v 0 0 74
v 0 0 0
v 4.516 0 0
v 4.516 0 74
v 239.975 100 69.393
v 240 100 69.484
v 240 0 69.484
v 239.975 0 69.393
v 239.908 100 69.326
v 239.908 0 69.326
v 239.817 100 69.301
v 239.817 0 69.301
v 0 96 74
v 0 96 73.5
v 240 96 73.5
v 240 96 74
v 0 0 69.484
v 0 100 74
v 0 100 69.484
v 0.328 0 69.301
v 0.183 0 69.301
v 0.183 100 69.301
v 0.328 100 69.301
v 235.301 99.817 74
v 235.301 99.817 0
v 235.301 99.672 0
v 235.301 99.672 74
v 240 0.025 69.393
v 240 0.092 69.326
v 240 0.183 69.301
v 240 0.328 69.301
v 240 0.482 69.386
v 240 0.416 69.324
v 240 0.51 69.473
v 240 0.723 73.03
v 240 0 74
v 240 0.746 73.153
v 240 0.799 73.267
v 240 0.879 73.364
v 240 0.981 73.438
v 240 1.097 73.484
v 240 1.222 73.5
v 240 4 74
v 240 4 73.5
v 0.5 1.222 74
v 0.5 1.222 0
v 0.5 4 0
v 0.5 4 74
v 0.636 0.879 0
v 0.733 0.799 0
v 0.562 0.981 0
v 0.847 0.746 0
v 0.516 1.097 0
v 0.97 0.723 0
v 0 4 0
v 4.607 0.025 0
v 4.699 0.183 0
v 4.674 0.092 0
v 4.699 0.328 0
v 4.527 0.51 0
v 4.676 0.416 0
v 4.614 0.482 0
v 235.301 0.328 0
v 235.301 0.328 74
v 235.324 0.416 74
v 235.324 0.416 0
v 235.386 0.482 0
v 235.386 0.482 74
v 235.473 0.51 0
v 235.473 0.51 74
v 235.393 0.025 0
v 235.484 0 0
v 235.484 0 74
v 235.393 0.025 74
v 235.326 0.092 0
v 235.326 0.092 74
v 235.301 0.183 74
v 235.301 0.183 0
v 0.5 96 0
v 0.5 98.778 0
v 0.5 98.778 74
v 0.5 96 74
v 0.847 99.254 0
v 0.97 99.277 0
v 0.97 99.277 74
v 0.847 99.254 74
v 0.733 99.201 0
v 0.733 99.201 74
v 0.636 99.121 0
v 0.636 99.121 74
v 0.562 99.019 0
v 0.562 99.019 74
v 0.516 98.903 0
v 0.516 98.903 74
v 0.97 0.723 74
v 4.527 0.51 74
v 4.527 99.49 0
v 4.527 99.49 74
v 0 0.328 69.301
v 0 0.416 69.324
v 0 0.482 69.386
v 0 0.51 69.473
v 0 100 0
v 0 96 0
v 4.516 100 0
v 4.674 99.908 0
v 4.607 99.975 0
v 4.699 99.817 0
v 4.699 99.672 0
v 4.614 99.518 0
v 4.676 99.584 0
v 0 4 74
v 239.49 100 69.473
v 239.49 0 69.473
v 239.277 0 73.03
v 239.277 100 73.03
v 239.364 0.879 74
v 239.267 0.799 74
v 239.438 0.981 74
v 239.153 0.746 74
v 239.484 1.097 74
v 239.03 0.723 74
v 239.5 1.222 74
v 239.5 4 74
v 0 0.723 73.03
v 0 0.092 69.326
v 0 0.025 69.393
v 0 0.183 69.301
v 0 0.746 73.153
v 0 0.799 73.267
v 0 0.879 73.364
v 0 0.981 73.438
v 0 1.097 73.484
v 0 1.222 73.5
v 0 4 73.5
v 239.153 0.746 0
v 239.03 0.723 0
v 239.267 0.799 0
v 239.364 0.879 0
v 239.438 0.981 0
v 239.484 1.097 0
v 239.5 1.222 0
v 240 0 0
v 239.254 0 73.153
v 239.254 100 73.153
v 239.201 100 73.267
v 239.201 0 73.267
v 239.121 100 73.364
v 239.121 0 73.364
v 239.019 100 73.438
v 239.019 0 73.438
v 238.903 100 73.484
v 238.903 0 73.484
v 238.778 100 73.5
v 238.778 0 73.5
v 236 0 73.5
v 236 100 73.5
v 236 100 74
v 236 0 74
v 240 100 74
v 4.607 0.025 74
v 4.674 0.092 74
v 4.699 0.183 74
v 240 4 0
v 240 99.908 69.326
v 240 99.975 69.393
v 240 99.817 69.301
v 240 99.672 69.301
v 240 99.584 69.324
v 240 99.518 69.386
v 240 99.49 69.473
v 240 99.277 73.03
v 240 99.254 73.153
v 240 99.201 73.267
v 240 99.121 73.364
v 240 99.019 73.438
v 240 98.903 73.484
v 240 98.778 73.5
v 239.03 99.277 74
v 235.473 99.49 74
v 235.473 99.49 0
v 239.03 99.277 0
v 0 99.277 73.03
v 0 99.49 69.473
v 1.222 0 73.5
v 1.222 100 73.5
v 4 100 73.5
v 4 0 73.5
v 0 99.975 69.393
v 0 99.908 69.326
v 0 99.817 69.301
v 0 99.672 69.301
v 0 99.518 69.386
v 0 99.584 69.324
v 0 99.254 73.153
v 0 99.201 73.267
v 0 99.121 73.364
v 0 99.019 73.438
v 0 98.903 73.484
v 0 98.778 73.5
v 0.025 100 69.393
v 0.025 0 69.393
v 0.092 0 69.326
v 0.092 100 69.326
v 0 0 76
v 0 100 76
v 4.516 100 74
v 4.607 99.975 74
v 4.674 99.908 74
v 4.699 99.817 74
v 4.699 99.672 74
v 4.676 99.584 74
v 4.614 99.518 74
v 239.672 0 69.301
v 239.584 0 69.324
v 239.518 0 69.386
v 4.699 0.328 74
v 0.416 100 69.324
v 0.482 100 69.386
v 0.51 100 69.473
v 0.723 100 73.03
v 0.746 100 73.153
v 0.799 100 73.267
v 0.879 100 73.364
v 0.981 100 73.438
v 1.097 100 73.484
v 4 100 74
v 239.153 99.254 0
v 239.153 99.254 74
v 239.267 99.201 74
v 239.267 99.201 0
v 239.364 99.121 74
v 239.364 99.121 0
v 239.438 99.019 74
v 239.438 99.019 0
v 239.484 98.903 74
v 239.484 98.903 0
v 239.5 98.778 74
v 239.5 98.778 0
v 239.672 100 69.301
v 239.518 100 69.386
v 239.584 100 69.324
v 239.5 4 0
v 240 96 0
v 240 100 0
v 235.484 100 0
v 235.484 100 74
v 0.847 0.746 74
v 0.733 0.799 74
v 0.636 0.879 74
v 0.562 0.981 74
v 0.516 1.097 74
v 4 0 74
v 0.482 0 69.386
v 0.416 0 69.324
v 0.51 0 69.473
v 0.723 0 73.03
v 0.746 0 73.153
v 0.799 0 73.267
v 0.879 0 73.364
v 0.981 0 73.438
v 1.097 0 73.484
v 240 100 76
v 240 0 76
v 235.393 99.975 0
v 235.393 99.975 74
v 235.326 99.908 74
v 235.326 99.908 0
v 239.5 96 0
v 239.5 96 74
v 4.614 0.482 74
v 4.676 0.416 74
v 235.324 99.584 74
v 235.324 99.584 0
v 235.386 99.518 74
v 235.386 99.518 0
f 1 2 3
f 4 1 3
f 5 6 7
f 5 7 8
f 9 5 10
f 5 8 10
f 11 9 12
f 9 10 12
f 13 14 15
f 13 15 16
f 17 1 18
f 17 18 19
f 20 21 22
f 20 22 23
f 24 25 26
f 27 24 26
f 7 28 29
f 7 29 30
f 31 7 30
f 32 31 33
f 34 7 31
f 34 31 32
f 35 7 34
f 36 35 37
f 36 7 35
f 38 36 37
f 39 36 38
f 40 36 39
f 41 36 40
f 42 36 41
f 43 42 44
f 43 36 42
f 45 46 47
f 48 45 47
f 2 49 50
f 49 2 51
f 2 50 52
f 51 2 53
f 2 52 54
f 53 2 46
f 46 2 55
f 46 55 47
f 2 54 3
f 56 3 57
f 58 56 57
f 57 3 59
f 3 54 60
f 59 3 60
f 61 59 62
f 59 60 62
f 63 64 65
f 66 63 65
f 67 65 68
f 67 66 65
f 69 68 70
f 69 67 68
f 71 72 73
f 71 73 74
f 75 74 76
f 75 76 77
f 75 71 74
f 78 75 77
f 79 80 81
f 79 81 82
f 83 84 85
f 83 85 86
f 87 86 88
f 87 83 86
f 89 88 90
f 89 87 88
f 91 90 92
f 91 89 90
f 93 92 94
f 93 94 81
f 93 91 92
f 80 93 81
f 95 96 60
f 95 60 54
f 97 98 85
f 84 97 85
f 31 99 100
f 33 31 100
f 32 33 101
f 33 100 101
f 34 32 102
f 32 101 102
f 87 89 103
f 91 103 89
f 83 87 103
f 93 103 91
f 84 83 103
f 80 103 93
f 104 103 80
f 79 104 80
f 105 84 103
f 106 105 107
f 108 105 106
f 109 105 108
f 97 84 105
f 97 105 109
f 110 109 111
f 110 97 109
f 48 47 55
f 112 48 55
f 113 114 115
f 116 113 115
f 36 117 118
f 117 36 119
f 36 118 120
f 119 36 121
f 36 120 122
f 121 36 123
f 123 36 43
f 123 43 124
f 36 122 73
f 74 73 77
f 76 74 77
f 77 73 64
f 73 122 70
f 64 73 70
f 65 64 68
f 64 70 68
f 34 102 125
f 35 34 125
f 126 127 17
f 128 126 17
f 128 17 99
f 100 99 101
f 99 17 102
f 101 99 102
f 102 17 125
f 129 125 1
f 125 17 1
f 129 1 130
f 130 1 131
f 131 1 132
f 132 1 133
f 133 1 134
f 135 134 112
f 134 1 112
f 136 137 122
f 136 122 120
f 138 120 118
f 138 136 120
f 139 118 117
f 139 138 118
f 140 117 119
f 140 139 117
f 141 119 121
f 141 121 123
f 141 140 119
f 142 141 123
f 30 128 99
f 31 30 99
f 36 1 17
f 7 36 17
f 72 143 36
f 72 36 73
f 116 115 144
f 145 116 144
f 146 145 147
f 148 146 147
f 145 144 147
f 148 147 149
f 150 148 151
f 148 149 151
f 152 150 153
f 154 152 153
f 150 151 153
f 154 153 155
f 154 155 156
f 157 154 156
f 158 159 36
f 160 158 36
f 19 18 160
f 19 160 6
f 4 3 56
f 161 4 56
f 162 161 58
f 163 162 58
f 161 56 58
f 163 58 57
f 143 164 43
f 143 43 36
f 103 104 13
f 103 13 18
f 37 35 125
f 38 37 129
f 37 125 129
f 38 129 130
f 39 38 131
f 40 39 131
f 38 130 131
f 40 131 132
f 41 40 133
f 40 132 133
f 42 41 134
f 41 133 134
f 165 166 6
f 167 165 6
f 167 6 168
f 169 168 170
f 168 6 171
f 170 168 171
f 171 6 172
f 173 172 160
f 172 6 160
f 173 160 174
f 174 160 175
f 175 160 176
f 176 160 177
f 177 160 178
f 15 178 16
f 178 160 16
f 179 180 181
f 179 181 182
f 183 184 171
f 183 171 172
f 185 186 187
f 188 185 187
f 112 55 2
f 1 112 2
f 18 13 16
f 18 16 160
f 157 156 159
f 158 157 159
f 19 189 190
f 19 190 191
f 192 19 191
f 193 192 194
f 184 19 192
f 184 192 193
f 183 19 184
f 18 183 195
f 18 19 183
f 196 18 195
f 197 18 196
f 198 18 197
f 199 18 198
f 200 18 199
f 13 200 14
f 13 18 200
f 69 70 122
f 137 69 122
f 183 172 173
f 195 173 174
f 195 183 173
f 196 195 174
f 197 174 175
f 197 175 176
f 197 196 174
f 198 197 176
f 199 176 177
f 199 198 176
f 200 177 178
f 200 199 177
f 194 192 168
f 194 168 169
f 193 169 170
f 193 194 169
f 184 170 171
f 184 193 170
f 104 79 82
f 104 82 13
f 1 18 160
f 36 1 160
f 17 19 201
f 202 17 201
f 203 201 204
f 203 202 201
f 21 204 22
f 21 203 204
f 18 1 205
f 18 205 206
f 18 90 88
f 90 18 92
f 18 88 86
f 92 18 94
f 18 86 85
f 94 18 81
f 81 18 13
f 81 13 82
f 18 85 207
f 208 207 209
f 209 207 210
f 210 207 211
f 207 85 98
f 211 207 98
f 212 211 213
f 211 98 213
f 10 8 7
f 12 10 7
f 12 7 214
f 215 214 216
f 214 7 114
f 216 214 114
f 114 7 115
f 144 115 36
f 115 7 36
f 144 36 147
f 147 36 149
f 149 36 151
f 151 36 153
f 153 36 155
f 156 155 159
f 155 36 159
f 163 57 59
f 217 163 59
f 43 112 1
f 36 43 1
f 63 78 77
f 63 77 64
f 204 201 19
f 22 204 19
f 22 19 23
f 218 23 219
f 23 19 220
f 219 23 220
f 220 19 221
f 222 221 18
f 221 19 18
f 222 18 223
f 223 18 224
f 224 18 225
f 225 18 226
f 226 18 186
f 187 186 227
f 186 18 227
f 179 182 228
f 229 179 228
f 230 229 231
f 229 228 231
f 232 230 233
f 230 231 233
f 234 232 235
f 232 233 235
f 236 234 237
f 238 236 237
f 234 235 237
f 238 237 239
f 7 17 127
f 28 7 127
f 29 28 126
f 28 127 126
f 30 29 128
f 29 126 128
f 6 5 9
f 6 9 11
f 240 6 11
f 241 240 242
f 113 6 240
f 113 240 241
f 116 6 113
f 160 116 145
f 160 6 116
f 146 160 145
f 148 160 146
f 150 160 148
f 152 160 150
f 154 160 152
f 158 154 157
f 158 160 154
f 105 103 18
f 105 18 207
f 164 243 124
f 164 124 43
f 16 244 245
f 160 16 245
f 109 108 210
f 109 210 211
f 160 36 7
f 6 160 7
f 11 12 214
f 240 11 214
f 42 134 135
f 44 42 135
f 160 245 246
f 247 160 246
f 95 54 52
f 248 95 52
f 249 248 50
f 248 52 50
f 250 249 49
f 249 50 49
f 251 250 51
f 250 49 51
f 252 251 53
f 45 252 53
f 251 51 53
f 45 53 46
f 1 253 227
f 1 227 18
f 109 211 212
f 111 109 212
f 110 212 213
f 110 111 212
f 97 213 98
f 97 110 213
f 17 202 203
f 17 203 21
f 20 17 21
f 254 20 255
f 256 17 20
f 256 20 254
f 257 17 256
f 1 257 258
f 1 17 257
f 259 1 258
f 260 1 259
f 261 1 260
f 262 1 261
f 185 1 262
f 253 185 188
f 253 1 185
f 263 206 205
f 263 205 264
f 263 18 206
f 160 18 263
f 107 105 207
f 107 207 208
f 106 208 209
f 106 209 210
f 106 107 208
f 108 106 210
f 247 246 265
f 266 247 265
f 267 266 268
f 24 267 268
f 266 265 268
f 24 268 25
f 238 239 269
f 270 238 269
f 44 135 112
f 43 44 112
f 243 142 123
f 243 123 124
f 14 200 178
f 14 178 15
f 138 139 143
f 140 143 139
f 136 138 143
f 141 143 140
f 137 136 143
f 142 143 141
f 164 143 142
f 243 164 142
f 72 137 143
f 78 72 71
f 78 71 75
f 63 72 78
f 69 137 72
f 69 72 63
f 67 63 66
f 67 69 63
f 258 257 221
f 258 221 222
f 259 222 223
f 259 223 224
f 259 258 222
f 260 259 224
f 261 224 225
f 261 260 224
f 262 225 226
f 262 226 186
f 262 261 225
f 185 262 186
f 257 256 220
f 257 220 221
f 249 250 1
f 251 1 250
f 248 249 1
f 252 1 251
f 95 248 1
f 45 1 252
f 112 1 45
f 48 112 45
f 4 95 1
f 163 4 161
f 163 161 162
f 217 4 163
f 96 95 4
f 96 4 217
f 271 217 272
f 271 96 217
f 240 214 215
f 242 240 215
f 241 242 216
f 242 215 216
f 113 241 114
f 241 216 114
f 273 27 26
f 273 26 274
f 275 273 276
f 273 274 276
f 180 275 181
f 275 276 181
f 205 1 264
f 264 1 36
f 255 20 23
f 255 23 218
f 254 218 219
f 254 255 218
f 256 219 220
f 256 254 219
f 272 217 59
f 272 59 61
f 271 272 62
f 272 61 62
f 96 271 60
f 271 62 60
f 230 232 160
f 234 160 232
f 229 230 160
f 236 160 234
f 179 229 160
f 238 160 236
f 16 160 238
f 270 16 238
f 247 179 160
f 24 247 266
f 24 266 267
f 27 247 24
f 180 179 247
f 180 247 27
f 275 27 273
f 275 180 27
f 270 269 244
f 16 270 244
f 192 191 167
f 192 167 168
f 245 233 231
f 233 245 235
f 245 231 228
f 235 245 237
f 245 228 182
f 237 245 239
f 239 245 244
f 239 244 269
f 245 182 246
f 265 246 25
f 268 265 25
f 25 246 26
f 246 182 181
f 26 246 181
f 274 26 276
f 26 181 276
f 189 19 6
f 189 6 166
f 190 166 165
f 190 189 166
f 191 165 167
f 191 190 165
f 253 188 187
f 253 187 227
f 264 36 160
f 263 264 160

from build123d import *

# Parameters (mm, degrees)
F1_DEPTH  = 74
F7_DEPTH  = 240
F11_DEPTH = 100
F15_START = 74
F14_W     = 239.9997659668
F14_H     = 99.9997994222
F15_DEPTH = 2


with BuildPart() as f1:
    # F0 (on Top) → F1 (new body)
    with BuildSketch(Plane.XY):
        with BuildLine():
            Line((0, 4), (0, 0))
            Line((0, 0), (4.515946983, 0))
            ThreePointArc((4.515946983, 0), (4.6453692955, 0.0536084771), (4.6989777726, 0.1830307896))
            Line((4.6989777726, 0.1830307896), (4.6989777726, 0.3275845574))
            ThreePointArc((4.6989777726, 0.3275845574), (4.6491750725, 0.4530857371), (4.5268696138, 0.5102891444))
            Line((4.5268696138, 0.5102891444), (0.9701617667, 0.7229198578))
            ThreePointArc((0.9701617667, 0.7229198578), (0.6360500607, 0.8791870283), (0.5, 1.2220287435))
            Line((0.5, 1.2220287435), (0.5, 4))
            Line((0.5, 4), (0, 4))
        make_face()
    extrude(amount=F1_DEPTH)


with BuildPart() as f3_1:
    # F3: instance of F1
    add(f1.part.mirror(Plane.XZ.offset(-50)))


with BuildPart() as f5_1:
    # F5: instance of F1
    add(f1.part.mirror(Plane.YZ.offset(120)))


with BuildPart() as f5_2:
    # F5: instance of F3_1
    add(f3_1.part.mirror(Plane.YZ.offset(120)))


with BuildPart() as f7:
    # F6 (on Right) → F7 (new body)
    with BuildSketch(Plane.YZ):
        with BuildLine():
            Line((0.1830307896, 69.3010222274), (0.3275845574, 69.3010222274))
            ThreePointArc((0.3275845574, 69.3010222274), (0.4530857371, 69.3508249275), (0.5102891444, 69.4731303862))
            Line((0.5102891444, 69.4731303862), (0.7229198578, 73.0298382333))
            ThreePointArc((0.7229198578, 73.0298382333), (0.8791870283, 73.3639499393), (1.2220287435, 73.5))
            Line((1.2220287435, 73.5), (4, 73.5))
            Line((4, 73.5), (4, 74))
            Line((4, 74), (0, 74))
            Line((0, 74), (0, 69.484053017))
            ThreePointArc((0, 69.484053017), (0.0536084771, 69.3546307045), (0.1830307896, 69.3010222274))
        make_face()
    extrude(amount=F7_DEPTH)


with BuildPart() as f9_1:
    # F9: instance of F7
    add(f7.part.mirror(Plane.XZ.offset(-50)))


with BuildPart() as f11:
    # F10 (on Front) → F11 (new body)
    with BuildSketch(Plane.XZ):
        with BuildLine():
            Line((0.1830307896, 69.3010222274), (0.3275845574, 69.3010222274))
            ThreePointArc((0.3275845574, 69.3010222274), (0.4530857371, 69.3508249275), (0.5102891444, 69.4731303862))
            Line((0.5102891444, 69.4731303862), (0.7229198578, 73.0298382333))
            ThreePointArc((0.7229198578, 73.0298382333), (0.8791870283, 73.3639499393), (1.2220287435, 73.5))
            Line((1.2220287435, 73.5), (4, 73.5))
            Line((4, 73.5), (4, 74))
            Line((4, 74), (0, 74))
            Line((0, 74), (0, 69.484053017))
            ThreePointArc((0, 69.484053017), (0.0536084771, 69.3546307045), (0.1830307896, 69.3010222274))
        make_face()
    extrude(amount=-F11_DEPTH)


with BuildPart() as f13_1:
    # F13: instance of F11
    add(f11.part.mirror(Plane.YZ.offset(120)))


with BuildPart() as f15:
    # F14 (on Top) → F15 (new body)
    with BuildSketch(Plane.XY.offset(F15_START)):
        with Locations((120.000096751, 50.0001315813)):
            Rectangle(F14_W, F14_H)
    extrude(amount=F15_DEPTH)


solid = Compound([f1.part, f3_1.part, f5_1.part, f5_2.part, f7.part, f9_1.part, f11.part, f13_1.part, f15.part])
